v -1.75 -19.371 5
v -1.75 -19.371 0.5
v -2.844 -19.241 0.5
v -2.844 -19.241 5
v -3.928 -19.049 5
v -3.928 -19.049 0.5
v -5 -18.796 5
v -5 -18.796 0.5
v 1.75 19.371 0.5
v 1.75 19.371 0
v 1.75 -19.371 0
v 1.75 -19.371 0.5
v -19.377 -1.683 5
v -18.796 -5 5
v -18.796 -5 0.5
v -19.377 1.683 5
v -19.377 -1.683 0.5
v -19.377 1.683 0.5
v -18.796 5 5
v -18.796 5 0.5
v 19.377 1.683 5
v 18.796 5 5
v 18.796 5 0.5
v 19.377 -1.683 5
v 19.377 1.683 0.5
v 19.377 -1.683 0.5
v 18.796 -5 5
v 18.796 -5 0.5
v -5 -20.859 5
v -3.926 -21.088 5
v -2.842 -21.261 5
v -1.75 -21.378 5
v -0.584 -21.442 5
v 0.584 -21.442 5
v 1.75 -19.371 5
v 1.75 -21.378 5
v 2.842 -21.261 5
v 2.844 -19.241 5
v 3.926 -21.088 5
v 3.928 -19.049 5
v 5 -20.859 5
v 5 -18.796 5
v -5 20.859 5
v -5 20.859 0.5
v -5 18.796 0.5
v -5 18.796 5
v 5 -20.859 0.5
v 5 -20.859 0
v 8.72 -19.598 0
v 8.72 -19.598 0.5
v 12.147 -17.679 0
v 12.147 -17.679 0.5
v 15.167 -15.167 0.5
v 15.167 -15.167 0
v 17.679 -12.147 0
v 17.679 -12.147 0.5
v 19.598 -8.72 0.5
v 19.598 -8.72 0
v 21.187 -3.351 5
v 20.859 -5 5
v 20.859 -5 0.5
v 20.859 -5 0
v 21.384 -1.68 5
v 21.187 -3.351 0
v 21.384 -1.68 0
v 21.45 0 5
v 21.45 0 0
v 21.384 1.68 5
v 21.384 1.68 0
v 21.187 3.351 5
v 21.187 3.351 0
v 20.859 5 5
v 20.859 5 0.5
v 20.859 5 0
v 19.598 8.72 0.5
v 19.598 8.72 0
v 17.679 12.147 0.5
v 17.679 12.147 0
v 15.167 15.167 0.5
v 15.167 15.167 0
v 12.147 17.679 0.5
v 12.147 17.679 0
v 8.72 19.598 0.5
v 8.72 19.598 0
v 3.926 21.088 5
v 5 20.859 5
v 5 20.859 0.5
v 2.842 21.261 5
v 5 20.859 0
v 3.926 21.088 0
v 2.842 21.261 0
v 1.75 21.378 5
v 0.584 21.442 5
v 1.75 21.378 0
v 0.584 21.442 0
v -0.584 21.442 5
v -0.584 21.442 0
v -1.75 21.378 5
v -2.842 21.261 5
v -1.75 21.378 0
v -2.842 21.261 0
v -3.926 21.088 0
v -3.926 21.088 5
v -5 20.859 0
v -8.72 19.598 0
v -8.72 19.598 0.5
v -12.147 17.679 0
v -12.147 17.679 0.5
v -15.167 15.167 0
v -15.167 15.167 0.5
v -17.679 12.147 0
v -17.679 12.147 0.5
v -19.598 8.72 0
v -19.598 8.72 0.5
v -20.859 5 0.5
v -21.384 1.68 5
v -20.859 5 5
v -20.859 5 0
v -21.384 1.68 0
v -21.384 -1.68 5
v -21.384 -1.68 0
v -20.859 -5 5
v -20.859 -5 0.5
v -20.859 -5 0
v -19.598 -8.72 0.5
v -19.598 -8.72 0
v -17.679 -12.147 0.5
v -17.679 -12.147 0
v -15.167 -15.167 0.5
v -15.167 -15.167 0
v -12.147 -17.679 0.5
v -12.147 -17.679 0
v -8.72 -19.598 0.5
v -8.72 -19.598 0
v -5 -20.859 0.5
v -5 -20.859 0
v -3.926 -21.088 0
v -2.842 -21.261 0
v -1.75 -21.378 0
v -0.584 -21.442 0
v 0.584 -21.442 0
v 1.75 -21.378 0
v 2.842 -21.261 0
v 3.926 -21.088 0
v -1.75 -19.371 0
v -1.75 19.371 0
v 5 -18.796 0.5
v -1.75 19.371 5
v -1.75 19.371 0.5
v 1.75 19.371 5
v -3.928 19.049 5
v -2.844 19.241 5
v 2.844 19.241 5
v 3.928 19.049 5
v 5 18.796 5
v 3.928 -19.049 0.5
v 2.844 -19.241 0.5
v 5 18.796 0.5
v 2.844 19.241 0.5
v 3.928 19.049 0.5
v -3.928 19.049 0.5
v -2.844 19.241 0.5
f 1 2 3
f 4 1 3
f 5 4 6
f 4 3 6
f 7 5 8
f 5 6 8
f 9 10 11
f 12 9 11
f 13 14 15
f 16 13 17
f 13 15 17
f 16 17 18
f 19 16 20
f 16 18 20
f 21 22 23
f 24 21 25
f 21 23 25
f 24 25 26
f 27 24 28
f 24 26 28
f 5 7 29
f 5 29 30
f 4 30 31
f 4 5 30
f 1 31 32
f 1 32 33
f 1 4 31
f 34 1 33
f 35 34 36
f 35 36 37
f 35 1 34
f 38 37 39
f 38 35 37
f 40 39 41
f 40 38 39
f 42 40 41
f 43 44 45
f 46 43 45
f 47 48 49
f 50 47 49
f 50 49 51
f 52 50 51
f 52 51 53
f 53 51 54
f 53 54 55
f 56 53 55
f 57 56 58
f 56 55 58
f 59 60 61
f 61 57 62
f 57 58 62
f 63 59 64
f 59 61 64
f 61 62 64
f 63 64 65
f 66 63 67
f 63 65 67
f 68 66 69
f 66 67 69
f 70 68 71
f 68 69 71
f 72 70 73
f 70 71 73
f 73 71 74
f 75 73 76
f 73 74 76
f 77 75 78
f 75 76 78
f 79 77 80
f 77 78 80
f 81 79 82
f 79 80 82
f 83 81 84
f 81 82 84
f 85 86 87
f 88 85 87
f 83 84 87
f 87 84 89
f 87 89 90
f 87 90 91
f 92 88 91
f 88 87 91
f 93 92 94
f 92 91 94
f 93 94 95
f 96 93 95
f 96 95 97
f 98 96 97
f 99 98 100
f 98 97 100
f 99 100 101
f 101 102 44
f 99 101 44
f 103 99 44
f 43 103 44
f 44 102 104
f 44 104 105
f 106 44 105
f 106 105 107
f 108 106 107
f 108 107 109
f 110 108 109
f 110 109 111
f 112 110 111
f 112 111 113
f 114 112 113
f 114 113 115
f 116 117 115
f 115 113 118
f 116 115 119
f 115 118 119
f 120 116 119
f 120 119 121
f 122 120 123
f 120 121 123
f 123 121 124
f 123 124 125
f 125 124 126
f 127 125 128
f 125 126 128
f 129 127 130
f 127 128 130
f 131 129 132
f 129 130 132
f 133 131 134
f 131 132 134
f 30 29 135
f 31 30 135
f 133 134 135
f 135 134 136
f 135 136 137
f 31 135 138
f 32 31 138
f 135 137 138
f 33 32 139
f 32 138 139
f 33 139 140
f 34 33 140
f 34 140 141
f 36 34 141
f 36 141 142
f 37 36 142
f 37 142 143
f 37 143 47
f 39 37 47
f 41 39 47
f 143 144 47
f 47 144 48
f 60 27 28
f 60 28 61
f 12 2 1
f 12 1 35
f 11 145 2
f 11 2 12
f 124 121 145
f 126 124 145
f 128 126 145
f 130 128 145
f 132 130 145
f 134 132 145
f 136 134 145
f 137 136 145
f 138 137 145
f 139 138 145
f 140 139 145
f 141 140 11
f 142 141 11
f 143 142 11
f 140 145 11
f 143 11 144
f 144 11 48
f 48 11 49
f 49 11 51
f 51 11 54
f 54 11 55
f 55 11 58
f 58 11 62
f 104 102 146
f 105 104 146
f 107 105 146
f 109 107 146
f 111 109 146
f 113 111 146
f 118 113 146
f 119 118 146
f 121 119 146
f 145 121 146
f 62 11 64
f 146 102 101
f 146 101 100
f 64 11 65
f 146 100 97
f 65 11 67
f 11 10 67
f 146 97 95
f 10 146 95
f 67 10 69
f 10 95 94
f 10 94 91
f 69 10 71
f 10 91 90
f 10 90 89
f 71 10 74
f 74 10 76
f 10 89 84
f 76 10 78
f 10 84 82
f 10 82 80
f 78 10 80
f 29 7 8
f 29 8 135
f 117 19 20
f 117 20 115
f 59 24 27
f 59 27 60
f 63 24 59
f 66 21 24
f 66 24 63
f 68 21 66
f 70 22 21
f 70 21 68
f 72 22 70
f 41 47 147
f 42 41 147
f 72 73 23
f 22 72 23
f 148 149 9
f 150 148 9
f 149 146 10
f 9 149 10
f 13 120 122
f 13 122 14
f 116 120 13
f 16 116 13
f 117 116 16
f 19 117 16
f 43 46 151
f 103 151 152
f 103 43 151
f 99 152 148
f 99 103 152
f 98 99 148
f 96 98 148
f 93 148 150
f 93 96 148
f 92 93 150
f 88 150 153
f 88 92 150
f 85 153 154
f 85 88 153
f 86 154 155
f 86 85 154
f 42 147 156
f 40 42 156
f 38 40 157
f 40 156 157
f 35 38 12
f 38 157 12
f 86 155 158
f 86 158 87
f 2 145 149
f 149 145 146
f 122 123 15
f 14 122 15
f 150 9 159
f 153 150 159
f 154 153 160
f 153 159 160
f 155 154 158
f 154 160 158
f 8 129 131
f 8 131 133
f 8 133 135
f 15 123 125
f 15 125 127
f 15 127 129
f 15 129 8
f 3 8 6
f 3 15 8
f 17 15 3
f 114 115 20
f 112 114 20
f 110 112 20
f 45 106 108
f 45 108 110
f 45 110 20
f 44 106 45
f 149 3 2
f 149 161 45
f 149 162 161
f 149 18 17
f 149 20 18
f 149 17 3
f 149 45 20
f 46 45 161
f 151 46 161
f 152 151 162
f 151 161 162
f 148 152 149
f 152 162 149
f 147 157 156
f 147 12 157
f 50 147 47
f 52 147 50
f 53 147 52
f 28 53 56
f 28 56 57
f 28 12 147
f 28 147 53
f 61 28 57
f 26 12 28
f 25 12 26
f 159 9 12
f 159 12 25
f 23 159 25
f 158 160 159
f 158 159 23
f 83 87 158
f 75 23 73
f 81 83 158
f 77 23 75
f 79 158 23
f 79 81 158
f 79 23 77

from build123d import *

# Parameters (mm, degrees)
F0_W     = 3.5
F0_H     = 1.4879982061
F0_W_2   = 3.25
F0_H_2   = 10
F0_H_3   = 0.5193831472
F1_DEPTH = 0.5
F2_DEPTH = 5


# Not quite as in the source:
# - a feature of the source that left no trace in its solid (it failed there, or was rolled back) is left out
# - a feature names something its author has since deleted; it is built from what else it names


with BuildPart() as f1:
    # F0 (on Top) → F1 (new body)
    with BuildSketch(Plane.XY):
        with BuildLine():
            Line((-1.75, 5), (-1.75, 19.3711125132))
            ThreePointArc((-1.75, 19.3711125132), (-3.3872134677, 19.1527879152), (-5, 18.7963427294))
            Line((-5, 18.7963427294), (-5, 5))
            Line((-5, 5), (-1.75, 5))
        make_face()
        with BuildLine():
            ThreePointArc((-5, 18.7963427294), (-3.3872134677, 19.1527879152), (-1.75, 19.3711125132))
            Line((-1.75, 19.3711125132), (-1.75, 20.8591107193))
            Line((-1.75, 20.8591107193), (-5, 20.8591107193))
            Line((-5, 20.8591107193), (-5, 18.7963427294))
        make_face()
        with Locations((0, 20.1151116163)):
            Rectangle(F0_W, F0_H)
        with BuildLine():
            Line((-5, 5), (-5, 18.7963427294))
            ThreePointArc((-5, 18.7963427294), (-13.7532268941, 13.7532268941), (-18.7963427294, 5))
            Line((-18.7963427294, 5), (-5, 5))
        make_face()
        with BuildLine():
            ThreePointArc((-18.7963427294, 5), (-13.7532268941, 13.7532268941), (-5, 18.7963427294))
            Line((-5, 18.7963427294), (-5, 20.8591107193))
            ThreePointArc((-5, 20.8591107193), (-15.1674404565, 15.1674404565), (-20.8591107193, 5))
            Line((-20.8591107193, 5), (-18.7963427294, 5))
        make_face()
        with Locations((-3.375, 0)):
            Rectangle(F0_W_2, F0_H_2)
        with Locations((0, 21.1188022929)):
            Rectangle(F0_W, F0_H_3)
        with BuildLine():
            Line((-5, 20.8591107193), (-1.75, 20.8591107193))
            Line((-1.75, 20.8591107193), (-1.75, 21.3784938665))
            ThreePointArc((-1.75, 21.3784938665), (-3.3849763239, 21.1812283706), (-5, 20.8591107193))
        make_face()
        with BuildLine():
            ThreePointArc((5, 18.7963427294), (3.3872134677, 19.1527879152), (1.75, 19.3711125132))
            Line((1.75, 19.3711125132), (1.75, 5))
            Line((1.75, 5), (5, 5))
            Line((5, 5), (5, 18.7963427294))
        make_face()
        with BuildLine():
            Line((1.75, 20.8591107193), (1.75, 19.3711125132))
            ThreePointArc((1.75, 19.3711125132), (3.3872134677, 19.1527879152), (5, 18.7963427294))
            Line((5, 18.7963427294), (5, 20.8591107193))
            Line((5, 20.8591107193), (1.75, 20.8591107193))
        make_face()
        with BuildLine():
            Line((-5, 5), (-18.7963427294, 5))
            ThreePointArc((-18.7963427294, 5), (-19.45, 0), (-18.7963427294, -5))
            Line((-18.7963427294, -5), (-5, -5))
            Line((-5, -5), (-5, 5))
        make_face()
        with BuildLine():
            ThreePointArc((-18.7963427294, -5), (-19.45, 0), (-18.7963427294, 5))
            Line((-18.7963427294, 5), (-20.8591107193, 5))
            Line((-20.8591107193, 5), (-20.8591107193, -5))
            Line((-20.8591107193, -5), (-18.7963427294, -5))
        make_face()
        with Locations((3.375, 0)):
            Rectangle(F0_W_2, F0_H_2)
        with BuildLine():
            Line((-1.75, -19.3711125132), (-1.75, -5))
            Line((-1.75, -5), (-5, -5))
            Line((-5, -5), (-5, -18.7963427294))
            ThreePointArc((-5, -18.7963427294), (-3.3872134677, -19.1527879152), (-1.75, -19.3711125132))
        make_face()
        with BuildLine():
            Line((1.75, 21.3784938665), (1.75, 20.8591107193))
            Line((1.75, 20.8591107193), (5, 20.8591107193))
            ThreePointArc((5, 20.8591107193), (3.3849763239, 21.1812283706), (1.75, 21.3784938665))
        make_face()
        with BuildLine():
            ThreePointArc((1.75, 21.3784938665), (0, 21.45), (-1.75, 21.3784938665))
            Line((-1.75, 21.3784938665), (1.75, 21.3784938665))
        make_face()
        with BuildLine():
            ThreePointArc((18.7963427294, 5), (13.7532268941, 13.7532268941), (5, 18.7963427294))
            Line((5, 18.7963427294), (5, 5))
            Line((5, 5), (18.7963427294, 5))
        make_face()
        with BuildLine():
            Line((5, 20.8591107193), (5, 18.7963427294))
            ThreePointArc((5, 18.7963427294), (13.7532268941, 13.7532268941), (18.7963427294, 5))
            Line((18.7963427294, 5), (20.8591107193, 5))
            ThreePointArc((20.8591107193, 5), (15.1674404565, 15.1674404565), (5, 20.8591107193))
        make_face()
        with BuildLine():
            Line((-5, -5), (-18.7963427294, -5))
            ThreePointArc((-18.7963427294, -5), (-13.7532268941, -13.7532268941), (-5, -18.7963427294))
            Line((-5, -18.7963427294), (-5, -5))
        make_face()
        with BuildLine():
            ThreePointArc((-5, -18.7963427294), (-13.7532268941, -13.7532268941), (-18.7963427294, -5))
            Line((-18.7963427294, -5), (-20.8591107193, -5))
            ThreePointArc((-20.8591107193, -5), (-15.1674404565, -15.1674404565), (-5, -20.8591107193))
            Line((-5, -20.8591107193), (-5, -18.7963427294))
        make_face()
        with BuildLine():
            Line((-20.8591107193, -5), (-20.8591107193, 5))
            ThreePointArc((-20.8591107193, 5), (-21.45, 0), (-20.8591107193, -5))
        make_face()
        with BuildLine():
            Line((18.7963427294, 5), (5, 5))
            Line((5, 5), (5, -5))
            Line((5, -5), (18.7963427294, -5))
            ThreePointArc((18.7963427294, -5), (19.45, 0), (18.7963427294, 5))
        make_face()
        with BuildLine():
            Line((5, -5), (1.75, -5))
            Line((1.75, -5), (1.75, -19.3711125132))
            ThreePointArc((1.75, -19.3711125132), (3.3872134677, -19.1527879152), (5, -18.7963427294))
            Line((5, -18.7963427294), (5, -5))
        make_face()
        with BuildLine():
            Line((-1.75, -20.8591107193), (-1.75, -19.3711125132))
            ThreePointArc((-1.75, -19.3711125132), (-3.3872134677, -19.1527879152), (-5, -18.7963427294))
            Line((-5, -18.7963427294), (-5, -20.8591107193))
            Line((-5, -20.8591107193), (-1.75, -20.8591107193))
        make_face()
        with Locations((0, -20.1151116163)):
            Rectangle(F0_W, F0_H)
        with BuildLine():
            Line((20.8591107193, 5), (18.7963427294, 5))
            ThreePointArc((18.7963427294, 5), (19.45, 0), (18.7963427294, -5))
            Line((18.7963427294, -5), (20.8591107193, -5))
            Line((20.8591107193, -5), (20.8591107193, 5))
        make_face()
        with BuildLine():
            Line((18.7963427294, -5), (5, -5))
            Line((5, -5), (5, -18.7963427294))
            ThreePointArc((5, -18.7963427294), (13.7532268941, -13.7532268941), (18.7963427294, -5))
        make_face()
        with BuildLine():
            ThreePointArc((5, -18.7963427294), (3.3872134677, -19.1527879152), (1.75, -19.3711125132))
            Line((1.75, -19.3711125132), (1.75, -20.8591107193))
            Line((1.75, -20.8591107193), (5, -20.8591107193))
            Line((5, -20.8591107193), (5, -18.7963427294))
        make_face()
        with BuildLine():
            Line((-1.75, -21.3784938665), (-1.75, -20.8591107193))
            Line((-1.75, -20.8591107193), (-5, -20.8591107193))
            ThreePointArc((-5, -20.8591107193), (-3.3849763239, -21.1812283706), (-1.75, -21.3784938665))
        make_face()
        with Locations((0, -21.1188022929)):
            Rectangle(F0_W, F0_H_3)
        with BuildLine():
            ThreePointArc((21.45, 0), (21.3017654776, 2.5173969761), (20.8591107193, 5))
            Line((20.8591107193, 5), (20.8591107193, -5))
            ThreePointArc((20.8591107193, -5), (21.3017654776, -2.5173969761), (21.45, 0))
        make_face()
        with BuildLine():
            Line((20.8591107193, -5), (18.7963427294, -5))
            ThreePointArc((18.7963427294, -5), (13.7532268941, -13.7532268941), (5, -18.7963427294))
            Line((5, -18.7963427294), (5, -20.8591107193))
            ThreePointArc((5, -20.8591107193), (15.1674404565, -15.1674404565), (20.8591107193, -5))
        make_face()
        with BuildLine():
            Line((5, -20.8591107193), (1.75, -20.8591107193))
            Line((1.75, -20.8591107193), (1.75, -21.3784938665))
            ThreePointArc((1.75, -21.3784938665), (3.3849763239, -21.1812283706), (5, -20.8591107193))
        make_face()
        with BuildLine():
            Line((1.75, -21.3784938665), (-1.75, -21.3784938665))
            ThreePointArc((-1.75, -21.3784938665), (0, -21.45), (1.75, -21.3784938665))
        make_face()
    extrude(amount=F1_DEPTH)

    # F0 (on Top) → F2 (join)
    with BuildSketch(Plane.XY):
        with BuildLine():
            ThreePointArc((-5, 18.7963427294), (-3.3872134677, 19.1527879152), (-1.75, 19.3711125132))
            Line((-1.75, 19.3711125132), (-1.75, 20.8591107193))
            Line((-1.75, 20.8591107193), (-5, 20.8591107193))
            Line((-5, 20.8591107193), (-5, 18.7963427294))
        make_face()
        with Locations((0, 20.1151116163)):
            Rectangle(F0_W, F0_H)
        with Locations((0, 21.1188022929)):
            Rectangle(F0_W, F0_H_3)
        with BuildLine():
            Line((-5, 20.8591107193), (-1.75, 20.8591107193))
            Line((-1.75, 20.8591107193), (-1.75, 21.3784938665))
            ThreePointArc((-1.75, 21.3784938665), (-3.3849763239, 21.1812283706), (-5, 20.8591107193))
        make_face()
        with BuildLine():
            Line((1.75, 20.8591107193), (1.75, 19.3711125132))
            ThreePointArc((1.75, 19.3711125132), (3.3872134677, 19.1527879152), (5, 18.7963427294))
            Line((5, 18.7963427294), (5, 20.8591107193))
            Line((5, 20.8591107193), (1.75, 20.8591107193))
        make_face()
        with BuildLine():
            ThreePointArc((-18.7963427294, -5), (-19.45, 0), (-18.7963427294, 5))
            Line((-18.7963427294, 5), (-20.8591107193, 5))
            Line((-20.8591107193, 5), (-20.8591107193, -5))
            Line((-20.8591107193, -5), (-18.7963427294, -5))
        make_face()
        with BuildLine():
            Line((1.75, 21.3784938665), (1.75, 20.8591107193))
            Line((1.75, 20.8591107193), (5, 20.8591107193))
            ThreePointArc((5, 20.8591107193), (3.3849763239, 21.1812283706), (1.75, 21.3784938665))
        make_face()
        with BuildLine():
            ThreePointArc((1.75, 21.3784938665), (0, 21.45), (-1.75, 21.3784938665))
            Line((-1.75, 21.3784938665), (1.75, 21.3784938665))
        make_face()
        with BuildLine():
            Line((-20.8591107193, -5), (-20.8591107193, 5))
            ThreePointArc((-20.8591107193, 5), (-21.45, 0), (-20.8591107193, -5))
        make_face()
        with BuildLine():
            Line((-1.75, -20.8591107193), (-1.75, -19.3711125132))
            ThreePointArc((-1.75, -19.3711125132), (-3.3872134677, -19.1527879152), (-5, -18.7963427294))
            Line((-5, -18.7963427294), (-5, -20.8591107193))
            Line((-5, -20.8591107193), (-1.75, -20.8591107193))
        make_face()
        with Locations((0, -20.1151116163)):
            Rectangle(F0_W, F0_H)
        with BuildLine():
            Line((20.8591107193, 5), (18.7963427294, 5))
            ThreePointArc((18.7963427294, 5), (19.45, 0), (18.7963427294, -5))
            Line((18.7963427294, -5), (20.8591107193, -5))
            Line((20.8591107193, -5), (20.8591107193, 5))
        make_face()
        with BuildLine():
            ThreePointArc((5, -18.7963427294), (3.3872134677, -19.1527879152), (1.75, -19.3711125132))
            Line((1.75, -19.3711125132), (1.75, -20.8591107193))
            Line((1.75, -20.8591107193), (5, -20.8591107193))
            Line((5, -20.8591107193), (5, -18.7963427294))
        make_face()
        with BuildLine():
            Line((-1.75, -21.3784938665), (-1.75, -20.8591107193))
            Line((-1.75, -20.8591107193), (-5, -20.8591107193))
            ThreePointArc((-5, -20.8591107193), (-3.3849763239, -21.1812283706), (-1.75, -21.3784938665))
        make_face()
        with Locations((0, -21.1188022929)):
            Rectangle(F0_W, F0_H_3)
        with BuildLine():
            ThreePointArc((21.45, 0), (21.3017654776, 2.5173969761), (20.8591107193, 5))
            Line((20.8591107193, 5), (20.8591107193, -5))
            ThreePointArc((20.8591107193, -5), (21.3017654776, -2.5173969761), (21.45, 0))
        make_face()
        with BuildLine():
            Line((5, -20.8591107193), (1.75, -20.8591107193))
            Line((1.75, -20.8591107193), (1.75, -21.3784938665))
            ThreePointArc((1.75, -21.3784938665), (3.3849763239, -21.1812283706), (5, -20.8591107193))
        make_face()
        with BuildLine():
            Line((1.75, -21.3784938665), (-1.75, -21.3784938665))
            ThreePointArc((-1.75, -21.3784938665), (0, -21.45), (1.75, -21.3784938665))
        make_face()
    extrude(amount=F2_DEPTH)


solid = f1.part
